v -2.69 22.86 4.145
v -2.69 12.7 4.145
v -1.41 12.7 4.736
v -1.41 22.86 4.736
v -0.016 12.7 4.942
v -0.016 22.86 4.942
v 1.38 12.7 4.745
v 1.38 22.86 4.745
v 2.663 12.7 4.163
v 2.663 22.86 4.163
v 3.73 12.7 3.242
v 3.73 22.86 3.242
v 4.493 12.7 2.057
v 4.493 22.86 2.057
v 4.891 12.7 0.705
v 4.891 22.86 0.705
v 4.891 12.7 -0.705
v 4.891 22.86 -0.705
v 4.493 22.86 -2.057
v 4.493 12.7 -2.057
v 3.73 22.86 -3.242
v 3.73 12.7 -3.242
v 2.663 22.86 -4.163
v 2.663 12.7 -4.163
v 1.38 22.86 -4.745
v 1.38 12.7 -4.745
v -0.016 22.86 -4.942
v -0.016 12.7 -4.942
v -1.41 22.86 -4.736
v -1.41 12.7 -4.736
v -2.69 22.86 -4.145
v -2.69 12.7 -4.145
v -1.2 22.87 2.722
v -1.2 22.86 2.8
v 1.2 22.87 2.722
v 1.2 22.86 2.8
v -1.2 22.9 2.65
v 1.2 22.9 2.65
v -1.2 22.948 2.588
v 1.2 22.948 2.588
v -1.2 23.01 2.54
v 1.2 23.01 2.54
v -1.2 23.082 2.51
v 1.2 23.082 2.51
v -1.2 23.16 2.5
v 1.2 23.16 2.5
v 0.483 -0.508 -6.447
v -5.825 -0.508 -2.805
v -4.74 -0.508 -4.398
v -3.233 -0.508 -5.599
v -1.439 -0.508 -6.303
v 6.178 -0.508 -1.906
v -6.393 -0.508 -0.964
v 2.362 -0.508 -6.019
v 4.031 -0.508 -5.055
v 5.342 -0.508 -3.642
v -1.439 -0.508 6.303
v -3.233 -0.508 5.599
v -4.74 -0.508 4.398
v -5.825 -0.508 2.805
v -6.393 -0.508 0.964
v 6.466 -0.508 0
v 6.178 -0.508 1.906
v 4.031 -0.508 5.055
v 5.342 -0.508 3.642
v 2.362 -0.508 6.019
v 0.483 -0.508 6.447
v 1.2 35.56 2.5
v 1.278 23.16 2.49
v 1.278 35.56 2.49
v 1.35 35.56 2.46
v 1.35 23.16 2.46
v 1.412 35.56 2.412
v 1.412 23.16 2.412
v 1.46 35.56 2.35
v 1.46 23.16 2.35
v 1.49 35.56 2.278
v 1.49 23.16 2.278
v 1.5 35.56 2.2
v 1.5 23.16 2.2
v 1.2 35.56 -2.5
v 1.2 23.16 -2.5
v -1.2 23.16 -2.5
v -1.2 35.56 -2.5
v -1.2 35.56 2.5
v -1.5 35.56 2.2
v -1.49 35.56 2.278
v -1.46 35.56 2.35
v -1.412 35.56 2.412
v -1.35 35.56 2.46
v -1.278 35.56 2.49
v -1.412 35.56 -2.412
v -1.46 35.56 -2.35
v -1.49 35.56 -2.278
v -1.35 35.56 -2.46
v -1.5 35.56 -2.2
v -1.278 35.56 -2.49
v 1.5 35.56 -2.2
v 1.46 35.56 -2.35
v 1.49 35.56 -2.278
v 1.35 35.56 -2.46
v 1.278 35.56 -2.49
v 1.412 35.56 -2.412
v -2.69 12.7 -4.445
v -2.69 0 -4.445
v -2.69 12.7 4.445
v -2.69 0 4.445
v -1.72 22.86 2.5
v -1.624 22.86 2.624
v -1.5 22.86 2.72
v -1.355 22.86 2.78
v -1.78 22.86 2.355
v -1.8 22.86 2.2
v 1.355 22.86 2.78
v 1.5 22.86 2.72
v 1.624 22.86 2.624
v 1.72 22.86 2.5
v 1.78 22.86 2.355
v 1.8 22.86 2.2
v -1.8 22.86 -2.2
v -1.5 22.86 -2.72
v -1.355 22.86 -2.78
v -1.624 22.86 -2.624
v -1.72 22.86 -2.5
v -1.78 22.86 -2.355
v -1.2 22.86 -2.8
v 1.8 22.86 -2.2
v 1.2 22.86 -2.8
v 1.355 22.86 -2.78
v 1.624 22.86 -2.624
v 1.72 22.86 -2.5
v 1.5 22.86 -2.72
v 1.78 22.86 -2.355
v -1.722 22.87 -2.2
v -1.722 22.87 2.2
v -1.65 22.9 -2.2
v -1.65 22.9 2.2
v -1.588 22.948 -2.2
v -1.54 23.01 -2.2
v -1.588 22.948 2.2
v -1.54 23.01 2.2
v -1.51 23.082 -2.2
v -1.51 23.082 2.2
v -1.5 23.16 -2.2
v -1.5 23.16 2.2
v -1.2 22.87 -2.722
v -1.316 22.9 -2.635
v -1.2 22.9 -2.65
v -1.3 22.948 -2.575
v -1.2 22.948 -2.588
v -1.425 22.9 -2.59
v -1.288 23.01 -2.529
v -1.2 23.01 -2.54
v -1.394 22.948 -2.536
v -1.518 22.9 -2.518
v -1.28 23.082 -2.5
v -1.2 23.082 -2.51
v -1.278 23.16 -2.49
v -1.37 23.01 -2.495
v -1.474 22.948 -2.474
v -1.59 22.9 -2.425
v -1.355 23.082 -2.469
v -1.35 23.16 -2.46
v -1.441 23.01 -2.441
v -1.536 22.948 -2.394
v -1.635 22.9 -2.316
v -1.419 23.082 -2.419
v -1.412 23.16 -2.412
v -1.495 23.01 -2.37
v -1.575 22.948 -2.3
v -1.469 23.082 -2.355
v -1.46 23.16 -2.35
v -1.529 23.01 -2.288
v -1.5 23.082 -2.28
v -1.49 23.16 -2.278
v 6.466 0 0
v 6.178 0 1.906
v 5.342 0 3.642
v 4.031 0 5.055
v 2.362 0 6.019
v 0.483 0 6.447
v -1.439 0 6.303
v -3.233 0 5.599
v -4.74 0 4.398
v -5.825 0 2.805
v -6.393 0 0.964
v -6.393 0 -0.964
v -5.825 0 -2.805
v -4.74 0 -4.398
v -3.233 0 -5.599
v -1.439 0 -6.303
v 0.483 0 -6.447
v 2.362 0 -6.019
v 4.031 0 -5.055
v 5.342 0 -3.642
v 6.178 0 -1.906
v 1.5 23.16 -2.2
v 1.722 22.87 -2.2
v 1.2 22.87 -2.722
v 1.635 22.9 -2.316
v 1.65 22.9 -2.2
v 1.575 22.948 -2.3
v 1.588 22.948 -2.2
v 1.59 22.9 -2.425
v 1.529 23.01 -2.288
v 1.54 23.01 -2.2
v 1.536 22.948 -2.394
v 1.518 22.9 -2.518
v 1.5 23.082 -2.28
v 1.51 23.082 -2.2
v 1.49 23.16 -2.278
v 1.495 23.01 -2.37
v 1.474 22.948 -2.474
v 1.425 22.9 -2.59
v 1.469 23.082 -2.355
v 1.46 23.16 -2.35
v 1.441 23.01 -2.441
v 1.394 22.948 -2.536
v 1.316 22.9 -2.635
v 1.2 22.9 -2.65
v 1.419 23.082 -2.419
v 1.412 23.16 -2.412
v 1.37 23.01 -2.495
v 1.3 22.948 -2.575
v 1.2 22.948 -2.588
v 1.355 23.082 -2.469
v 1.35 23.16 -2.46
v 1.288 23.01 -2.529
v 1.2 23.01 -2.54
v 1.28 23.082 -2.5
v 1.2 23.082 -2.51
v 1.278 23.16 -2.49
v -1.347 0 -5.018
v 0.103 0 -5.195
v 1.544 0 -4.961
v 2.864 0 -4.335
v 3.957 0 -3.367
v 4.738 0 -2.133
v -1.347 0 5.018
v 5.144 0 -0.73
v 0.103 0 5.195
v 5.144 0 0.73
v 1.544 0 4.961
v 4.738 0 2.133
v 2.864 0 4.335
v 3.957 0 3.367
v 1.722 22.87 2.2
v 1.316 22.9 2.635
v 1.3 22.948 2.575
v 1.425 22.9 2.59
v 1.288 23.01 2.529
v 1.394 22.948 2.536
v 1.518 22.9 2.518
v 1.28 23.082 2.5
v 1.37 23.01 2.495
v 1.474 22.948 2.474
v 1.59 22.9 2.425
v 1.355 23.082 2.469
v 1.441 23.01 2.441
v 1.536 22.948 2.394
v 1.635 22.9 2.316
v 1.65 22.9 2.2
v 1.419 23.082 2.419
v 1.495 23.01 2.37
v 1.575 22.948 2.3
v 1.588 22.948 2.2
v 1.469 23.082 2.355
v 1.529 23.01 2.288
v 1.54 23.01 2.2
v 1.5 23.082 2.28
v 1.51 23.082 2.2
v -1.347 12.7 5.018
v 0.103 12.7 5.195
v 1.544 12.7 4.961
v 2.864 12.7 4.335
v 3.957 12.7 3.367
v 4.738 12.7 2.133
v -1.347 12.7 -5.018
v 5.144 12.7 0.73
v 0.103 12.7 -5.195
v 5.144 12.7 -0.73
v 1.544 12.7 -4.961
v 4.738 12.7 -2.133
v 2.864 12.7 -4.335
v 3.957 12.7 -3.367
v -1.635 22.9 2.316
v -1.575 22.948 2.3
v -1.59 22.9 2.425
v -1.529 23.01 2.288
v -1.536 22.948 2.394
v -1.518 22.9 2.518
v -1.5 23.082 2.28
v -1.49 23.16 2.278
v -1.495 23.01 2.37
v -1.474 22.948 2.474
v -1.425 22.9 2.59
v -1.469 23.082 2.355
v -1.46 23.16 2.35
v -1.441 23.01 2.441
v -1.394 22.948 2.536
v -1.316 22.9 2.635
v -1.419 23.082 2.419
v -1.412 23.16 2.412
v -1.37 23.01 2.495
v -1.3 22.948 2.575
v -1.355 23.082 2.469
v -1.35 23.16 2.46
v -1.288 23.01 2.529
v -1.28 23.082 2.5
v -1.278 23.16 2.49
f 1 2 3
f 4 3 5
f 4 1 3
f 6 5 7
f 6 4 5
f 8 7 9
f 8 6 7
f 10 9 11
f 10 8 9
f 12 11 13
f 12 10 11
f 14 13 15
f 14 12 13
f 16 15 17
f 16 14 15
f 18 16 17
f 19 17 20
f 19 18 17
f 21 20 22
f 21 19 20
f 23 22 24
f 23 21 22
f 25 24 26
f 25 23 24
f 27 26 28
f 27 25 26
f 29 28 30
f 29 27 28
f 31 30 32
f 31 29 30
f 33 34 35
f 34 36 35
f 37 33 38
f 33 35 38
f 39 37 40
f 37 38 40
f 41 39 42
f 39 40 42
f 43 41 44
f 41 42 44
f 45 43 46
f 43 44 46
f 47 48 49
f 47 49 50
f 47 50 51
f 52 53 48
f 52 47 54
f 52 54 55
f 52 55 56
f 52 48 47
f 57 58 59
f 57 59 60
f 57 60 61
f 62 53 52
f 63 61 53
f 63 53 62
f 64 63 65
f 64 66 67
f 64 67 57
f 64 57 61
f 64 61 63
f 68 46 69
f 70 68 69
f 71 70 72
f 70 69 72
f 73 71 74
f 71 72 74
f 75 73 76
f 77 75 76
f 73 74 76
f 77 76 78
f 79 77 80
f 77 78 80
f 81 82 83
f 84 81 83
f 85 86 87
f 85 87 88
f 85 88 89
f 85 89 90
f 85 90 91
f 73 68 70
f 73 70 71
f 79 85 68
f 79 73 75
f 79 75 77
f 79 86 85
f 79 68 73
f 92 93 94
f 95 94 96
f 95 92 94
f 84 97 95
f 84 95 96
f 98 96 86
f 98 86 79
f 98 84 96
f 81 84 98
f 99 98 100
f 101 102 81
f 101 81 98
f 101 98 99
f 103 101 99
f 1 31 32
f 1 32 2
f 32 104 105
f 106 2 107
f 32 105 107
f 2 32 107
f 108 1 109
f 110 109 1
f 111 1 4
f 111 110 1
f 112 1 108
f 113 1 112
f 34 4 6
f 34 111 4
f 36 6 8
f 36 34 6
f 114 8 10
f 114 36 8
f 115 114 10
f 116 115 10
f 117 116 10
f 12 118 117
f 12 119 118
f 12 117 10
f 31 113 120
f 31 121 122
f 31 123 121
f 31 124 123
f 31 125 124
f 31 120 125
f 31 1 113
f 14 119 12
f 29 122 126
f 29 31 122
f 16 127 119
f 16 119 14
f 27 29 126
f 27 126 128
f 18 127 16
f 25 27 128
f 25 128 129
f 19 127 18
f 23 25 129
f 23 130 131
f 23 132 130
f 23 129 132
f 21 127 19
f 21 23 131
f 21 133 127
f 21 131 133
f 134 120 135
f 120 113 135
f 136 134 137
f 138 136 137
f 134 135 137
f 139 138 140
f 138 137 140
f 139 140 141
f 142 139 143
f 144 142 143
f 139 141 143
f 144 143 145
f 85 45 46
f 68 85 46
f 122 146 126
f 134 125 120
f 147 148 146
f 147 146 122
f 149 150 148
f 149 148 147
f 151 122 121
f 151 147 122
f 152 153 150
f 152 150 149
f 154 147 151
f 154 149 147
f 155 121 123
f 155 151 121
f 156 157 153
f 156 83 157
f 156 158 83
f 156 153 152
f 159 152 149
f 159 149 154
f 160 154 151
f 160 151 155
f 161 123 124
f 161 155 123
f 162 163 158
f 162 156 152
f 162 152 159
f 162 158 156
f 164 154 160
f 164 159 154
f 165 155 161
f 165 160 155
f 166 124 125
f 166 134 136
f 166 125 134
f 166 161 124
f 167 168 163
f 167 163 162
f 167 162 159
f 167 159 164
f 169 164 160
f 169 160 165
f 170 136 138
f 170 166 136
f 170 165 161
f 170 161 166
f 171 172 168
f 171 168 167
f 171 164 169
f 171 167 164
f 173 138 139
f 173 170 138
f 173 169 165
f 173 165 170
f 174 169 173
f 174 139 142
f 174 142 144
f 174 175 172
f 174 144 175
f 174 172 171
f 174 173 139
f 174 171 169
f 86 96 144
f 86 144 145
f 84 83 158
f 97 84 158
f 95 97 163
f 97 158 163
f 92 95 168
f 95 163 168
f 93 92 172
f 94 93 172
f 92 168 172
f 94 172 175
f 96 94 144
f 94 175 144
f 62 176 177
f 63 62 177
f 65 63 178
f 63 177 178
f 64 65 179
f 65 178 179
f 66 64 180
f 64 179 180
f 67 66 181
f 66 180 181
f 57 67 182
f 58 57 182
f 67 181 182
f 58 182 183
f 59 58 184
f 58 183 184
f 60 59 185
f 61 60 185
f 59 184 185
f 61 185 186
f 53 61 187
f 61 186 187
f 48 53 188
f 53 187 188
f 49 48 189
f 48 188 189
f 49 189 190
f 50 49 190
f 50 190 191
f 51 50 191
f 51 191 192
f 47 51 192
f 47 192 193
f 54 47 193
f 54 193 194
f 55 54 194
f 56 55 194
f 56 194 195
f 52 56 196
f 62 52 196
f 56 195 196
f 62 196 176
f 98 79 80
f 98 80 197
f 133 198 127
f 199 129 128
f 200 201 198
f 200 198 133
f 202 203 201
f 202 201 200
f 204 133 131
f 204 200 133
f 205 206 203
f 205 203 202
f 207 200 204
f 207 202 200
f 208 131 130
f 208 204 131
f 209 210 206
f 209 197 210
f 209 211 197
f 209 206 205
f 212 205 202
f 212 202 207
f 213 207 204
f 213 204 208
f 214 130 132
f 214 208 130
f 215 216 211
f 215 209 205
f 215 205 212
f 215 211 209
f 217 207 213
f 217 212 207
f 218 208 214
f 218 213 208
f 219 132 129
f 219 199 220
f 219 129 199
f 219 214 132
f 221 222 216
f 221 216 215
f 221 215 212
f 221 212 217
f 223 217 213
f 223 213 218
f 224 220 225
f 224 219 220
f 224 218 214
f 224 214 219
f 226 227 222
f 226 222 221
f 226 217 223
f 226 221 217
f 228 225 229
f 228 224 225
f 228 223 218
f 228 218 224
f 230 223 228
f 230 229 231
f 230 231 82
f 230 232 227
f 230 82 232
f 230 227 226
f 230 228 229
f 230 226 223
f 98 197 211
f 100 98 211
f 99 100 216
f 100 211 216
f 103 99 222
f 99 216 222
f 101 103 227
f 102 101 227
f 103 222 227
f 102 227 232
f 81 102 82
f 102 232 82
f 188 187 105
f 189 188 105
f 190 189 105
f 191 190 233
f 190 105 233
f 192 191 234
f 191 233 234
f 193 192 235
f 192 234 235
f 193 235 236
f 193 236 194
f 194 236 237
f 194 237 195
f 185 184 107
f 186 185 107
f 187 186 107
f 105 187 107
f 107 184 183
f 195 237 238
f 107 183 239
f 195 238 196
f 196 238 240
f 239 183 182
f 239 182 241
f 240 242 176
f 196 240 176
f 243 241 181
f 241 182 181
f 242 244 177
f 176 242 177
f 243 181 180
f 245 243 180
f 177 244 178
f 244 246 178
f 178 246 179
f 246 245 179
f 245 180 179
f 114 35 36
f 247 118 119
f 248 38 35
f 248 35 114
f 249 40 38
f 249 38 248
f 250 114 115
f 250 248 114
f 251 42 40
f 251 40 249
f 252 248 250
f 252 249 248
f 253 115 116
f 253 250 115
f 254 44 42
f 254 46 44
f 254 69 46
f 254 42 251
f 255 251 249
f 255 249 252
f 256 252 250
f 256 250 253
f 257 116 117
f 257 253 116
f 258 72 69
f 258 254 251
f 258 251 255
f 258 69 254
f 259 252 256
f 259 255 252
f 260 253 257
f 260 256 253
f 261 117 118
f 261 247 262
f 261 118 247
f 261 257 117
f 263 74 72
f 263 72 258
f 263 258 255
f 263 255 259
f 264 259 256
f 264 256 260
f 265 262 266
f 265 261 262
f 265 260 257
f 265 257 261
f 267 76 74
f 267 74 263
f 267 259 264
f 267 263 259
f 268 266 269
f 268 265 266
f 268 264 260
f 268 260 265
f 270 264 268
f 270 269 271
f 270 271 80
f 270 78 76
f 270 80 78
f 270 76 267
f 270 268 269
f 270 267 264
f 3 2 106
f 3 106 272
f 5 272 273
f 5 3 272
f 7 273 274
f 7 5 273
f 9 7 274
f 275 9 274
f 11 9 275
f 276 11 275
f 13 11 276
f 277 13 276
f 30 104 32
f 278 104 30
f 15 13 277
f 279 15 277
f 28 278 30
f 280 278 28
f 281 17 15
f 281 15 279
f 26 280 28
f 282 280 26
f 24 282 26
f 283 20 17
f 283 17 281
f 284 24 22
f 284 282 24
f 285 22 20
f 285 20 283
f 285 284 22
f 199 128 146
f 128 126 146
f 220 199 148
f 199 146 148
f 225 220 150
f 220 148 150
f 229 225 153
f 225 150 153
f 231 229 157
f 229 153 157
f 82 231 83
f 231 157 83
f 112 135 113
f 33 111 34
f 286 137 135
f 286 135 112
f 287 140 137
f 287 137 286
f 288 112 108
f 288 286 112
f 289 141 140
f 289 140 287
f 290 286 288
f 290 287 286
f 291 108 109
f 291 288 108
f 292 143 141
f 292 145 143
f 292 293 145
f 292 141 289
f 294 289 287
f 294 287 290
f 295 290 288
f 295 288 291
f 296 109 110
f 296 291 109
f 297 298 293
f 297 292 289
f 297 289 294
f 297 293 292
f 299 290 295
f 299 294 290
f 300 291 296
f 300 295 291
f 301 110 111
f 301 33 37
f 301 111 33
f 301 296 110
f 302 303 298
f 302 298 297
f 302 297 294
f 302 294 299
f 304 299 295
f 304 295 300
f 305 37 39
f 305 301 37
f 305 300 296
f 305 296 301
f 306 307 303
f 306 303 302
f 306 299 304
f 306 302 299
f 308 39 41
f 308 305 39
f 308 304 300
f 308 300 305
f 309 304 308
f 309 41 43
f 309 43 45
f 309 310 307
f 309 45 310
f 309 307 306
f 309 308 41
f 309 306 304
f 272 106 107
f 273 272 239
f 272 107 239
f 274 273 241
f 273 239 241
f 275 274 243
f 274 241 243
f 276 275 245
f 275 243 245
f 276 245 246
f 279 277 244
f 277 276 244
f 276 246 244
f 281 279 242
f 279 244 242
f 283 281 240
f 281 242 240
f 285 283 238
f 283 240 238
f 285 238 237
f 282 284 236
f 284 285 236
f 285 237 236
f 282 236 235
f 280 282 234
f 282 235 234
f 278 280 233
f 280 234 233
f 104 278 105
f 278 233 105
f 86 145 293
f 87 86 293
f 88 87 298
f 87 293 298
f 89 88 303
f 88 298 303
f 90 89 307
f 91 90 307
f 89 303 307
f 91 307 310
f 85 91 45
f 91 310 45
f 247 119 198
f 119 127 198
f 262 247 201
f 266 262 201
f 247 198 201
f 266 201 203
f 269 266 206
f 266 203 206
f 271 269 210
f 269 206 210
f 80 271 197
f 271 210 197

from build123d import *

# Parameters (mm, degrees)
BOSS_EXTRUDE1_DEPTH = 22.86
BOSS_EXTRUDE2_DEPTH = 12.7
FILLET1_R           = 0.3
SKETCH3_R           = 6.46557
BOSS_EXTRUDE3_DEPTH = 0.508
SKETCH4_OUTSIDE_W   = 23.02
SKETCH4_OUTSIDE_H   = 23.02
SKETCH4_OUTSIDE_R   = 4.94157
CUT_EXTRUDE1_DEPTH  = 10.16


with BuildPart() as part:
    # Sketch1 → Boss-Extrude1 (new body)
    with BuildSketch(Plane(origin=(0, 0, 0), x_dir=(1, 0, 0), z_dir=(0, 1, 0))):
        with BuildLine():
            Line((-2.68996703, 4.445), (-2.68996703, -4.445))
            ThreePointArc((-2.68996703, -4.445), (5.19557, 0), (-2.68996703, 4.445))
        make_face()
    extrude(amount=BOSS_EXTRUDE1_DEPTH)

    # Sketch2 → Boss-Extrude2 (add)
    with BuildSketch(Plane(origin=(0, 22.86, 0), x_dir=(1, 0, 0), z_dir=(0, 1, 0))):
        with BuildLine():
            Line((-1.2, -2.5), (1.2, -2.5))
            ThreePointArc((1.2, -2.5), (1.412132034, -2.412132034), (1.5, -2.2))
            Line((1.5, -2.2), (1.5, 2.2))
            ThreePointArc((1.5, 2.2), (1.412132034, 2.412132034), (1.2, 2.5))
            Line((1.2, 2.5), (-1.2, 2.5))
            ThreePointArc((-1.2, 2.5), (-1.412132034, 2.412132034), (-1.5, 2.2))
            Line((-1.5, 2.2), (-1.5, -2.2))
            ThreePointArc((-1.5, -2.2), (-1.412132034, -2.412132034), (-1.2, -2.5))
        make_face()
    extrude(amount=BOSS_EXTRUDE2_DEPTH)

    # Fillet1
    fillet1_edges = [part.edges().sort_by_distance(p)[0] for p in [
        (-1.412132034, 22.86, 2.412132034),
        (0, 22.86, 2.5),
        (1.412132034, 22.86, 2.412132034),
        (1.5, 22.86, 0),
        (1.412132034, 22.86, -2.412132034),
        (0, 22.86, -2.5),
        (-1.412132034, 22.86, -2.412132034),
        (-1.5, 22.86, 0),
    ]]
    fillet(fillet1_edges, radius=FILLET1_R)

    # Sketch3 → Boss-Extrude3 (add)
    with BuildSketch(Plane.XZ):
        Circle(SKETCH3_R)
    extrude(amount=BOSS_EXTRUDE3_DEPTH)

    # Sketch4 outside → Cut-Extrude1 (cut)
    with BuildSketch(Plane(origin=(0, 22.86, 0), x_dir=(1, 0, 0), z_dir=(0, 1, 0))):
        Rectangle(SKETCH4_OUTSIDE_W, SKETCH4_OUTSIDE_H)
        Circle(SKETCH4_OUTSIDE_R, mode=Mode.SUBTRACT)
    extrude(amount=-CUT_EXTRUDE1_DEPTH, mode=Mode.SUBTRACT)


solid = part.part
